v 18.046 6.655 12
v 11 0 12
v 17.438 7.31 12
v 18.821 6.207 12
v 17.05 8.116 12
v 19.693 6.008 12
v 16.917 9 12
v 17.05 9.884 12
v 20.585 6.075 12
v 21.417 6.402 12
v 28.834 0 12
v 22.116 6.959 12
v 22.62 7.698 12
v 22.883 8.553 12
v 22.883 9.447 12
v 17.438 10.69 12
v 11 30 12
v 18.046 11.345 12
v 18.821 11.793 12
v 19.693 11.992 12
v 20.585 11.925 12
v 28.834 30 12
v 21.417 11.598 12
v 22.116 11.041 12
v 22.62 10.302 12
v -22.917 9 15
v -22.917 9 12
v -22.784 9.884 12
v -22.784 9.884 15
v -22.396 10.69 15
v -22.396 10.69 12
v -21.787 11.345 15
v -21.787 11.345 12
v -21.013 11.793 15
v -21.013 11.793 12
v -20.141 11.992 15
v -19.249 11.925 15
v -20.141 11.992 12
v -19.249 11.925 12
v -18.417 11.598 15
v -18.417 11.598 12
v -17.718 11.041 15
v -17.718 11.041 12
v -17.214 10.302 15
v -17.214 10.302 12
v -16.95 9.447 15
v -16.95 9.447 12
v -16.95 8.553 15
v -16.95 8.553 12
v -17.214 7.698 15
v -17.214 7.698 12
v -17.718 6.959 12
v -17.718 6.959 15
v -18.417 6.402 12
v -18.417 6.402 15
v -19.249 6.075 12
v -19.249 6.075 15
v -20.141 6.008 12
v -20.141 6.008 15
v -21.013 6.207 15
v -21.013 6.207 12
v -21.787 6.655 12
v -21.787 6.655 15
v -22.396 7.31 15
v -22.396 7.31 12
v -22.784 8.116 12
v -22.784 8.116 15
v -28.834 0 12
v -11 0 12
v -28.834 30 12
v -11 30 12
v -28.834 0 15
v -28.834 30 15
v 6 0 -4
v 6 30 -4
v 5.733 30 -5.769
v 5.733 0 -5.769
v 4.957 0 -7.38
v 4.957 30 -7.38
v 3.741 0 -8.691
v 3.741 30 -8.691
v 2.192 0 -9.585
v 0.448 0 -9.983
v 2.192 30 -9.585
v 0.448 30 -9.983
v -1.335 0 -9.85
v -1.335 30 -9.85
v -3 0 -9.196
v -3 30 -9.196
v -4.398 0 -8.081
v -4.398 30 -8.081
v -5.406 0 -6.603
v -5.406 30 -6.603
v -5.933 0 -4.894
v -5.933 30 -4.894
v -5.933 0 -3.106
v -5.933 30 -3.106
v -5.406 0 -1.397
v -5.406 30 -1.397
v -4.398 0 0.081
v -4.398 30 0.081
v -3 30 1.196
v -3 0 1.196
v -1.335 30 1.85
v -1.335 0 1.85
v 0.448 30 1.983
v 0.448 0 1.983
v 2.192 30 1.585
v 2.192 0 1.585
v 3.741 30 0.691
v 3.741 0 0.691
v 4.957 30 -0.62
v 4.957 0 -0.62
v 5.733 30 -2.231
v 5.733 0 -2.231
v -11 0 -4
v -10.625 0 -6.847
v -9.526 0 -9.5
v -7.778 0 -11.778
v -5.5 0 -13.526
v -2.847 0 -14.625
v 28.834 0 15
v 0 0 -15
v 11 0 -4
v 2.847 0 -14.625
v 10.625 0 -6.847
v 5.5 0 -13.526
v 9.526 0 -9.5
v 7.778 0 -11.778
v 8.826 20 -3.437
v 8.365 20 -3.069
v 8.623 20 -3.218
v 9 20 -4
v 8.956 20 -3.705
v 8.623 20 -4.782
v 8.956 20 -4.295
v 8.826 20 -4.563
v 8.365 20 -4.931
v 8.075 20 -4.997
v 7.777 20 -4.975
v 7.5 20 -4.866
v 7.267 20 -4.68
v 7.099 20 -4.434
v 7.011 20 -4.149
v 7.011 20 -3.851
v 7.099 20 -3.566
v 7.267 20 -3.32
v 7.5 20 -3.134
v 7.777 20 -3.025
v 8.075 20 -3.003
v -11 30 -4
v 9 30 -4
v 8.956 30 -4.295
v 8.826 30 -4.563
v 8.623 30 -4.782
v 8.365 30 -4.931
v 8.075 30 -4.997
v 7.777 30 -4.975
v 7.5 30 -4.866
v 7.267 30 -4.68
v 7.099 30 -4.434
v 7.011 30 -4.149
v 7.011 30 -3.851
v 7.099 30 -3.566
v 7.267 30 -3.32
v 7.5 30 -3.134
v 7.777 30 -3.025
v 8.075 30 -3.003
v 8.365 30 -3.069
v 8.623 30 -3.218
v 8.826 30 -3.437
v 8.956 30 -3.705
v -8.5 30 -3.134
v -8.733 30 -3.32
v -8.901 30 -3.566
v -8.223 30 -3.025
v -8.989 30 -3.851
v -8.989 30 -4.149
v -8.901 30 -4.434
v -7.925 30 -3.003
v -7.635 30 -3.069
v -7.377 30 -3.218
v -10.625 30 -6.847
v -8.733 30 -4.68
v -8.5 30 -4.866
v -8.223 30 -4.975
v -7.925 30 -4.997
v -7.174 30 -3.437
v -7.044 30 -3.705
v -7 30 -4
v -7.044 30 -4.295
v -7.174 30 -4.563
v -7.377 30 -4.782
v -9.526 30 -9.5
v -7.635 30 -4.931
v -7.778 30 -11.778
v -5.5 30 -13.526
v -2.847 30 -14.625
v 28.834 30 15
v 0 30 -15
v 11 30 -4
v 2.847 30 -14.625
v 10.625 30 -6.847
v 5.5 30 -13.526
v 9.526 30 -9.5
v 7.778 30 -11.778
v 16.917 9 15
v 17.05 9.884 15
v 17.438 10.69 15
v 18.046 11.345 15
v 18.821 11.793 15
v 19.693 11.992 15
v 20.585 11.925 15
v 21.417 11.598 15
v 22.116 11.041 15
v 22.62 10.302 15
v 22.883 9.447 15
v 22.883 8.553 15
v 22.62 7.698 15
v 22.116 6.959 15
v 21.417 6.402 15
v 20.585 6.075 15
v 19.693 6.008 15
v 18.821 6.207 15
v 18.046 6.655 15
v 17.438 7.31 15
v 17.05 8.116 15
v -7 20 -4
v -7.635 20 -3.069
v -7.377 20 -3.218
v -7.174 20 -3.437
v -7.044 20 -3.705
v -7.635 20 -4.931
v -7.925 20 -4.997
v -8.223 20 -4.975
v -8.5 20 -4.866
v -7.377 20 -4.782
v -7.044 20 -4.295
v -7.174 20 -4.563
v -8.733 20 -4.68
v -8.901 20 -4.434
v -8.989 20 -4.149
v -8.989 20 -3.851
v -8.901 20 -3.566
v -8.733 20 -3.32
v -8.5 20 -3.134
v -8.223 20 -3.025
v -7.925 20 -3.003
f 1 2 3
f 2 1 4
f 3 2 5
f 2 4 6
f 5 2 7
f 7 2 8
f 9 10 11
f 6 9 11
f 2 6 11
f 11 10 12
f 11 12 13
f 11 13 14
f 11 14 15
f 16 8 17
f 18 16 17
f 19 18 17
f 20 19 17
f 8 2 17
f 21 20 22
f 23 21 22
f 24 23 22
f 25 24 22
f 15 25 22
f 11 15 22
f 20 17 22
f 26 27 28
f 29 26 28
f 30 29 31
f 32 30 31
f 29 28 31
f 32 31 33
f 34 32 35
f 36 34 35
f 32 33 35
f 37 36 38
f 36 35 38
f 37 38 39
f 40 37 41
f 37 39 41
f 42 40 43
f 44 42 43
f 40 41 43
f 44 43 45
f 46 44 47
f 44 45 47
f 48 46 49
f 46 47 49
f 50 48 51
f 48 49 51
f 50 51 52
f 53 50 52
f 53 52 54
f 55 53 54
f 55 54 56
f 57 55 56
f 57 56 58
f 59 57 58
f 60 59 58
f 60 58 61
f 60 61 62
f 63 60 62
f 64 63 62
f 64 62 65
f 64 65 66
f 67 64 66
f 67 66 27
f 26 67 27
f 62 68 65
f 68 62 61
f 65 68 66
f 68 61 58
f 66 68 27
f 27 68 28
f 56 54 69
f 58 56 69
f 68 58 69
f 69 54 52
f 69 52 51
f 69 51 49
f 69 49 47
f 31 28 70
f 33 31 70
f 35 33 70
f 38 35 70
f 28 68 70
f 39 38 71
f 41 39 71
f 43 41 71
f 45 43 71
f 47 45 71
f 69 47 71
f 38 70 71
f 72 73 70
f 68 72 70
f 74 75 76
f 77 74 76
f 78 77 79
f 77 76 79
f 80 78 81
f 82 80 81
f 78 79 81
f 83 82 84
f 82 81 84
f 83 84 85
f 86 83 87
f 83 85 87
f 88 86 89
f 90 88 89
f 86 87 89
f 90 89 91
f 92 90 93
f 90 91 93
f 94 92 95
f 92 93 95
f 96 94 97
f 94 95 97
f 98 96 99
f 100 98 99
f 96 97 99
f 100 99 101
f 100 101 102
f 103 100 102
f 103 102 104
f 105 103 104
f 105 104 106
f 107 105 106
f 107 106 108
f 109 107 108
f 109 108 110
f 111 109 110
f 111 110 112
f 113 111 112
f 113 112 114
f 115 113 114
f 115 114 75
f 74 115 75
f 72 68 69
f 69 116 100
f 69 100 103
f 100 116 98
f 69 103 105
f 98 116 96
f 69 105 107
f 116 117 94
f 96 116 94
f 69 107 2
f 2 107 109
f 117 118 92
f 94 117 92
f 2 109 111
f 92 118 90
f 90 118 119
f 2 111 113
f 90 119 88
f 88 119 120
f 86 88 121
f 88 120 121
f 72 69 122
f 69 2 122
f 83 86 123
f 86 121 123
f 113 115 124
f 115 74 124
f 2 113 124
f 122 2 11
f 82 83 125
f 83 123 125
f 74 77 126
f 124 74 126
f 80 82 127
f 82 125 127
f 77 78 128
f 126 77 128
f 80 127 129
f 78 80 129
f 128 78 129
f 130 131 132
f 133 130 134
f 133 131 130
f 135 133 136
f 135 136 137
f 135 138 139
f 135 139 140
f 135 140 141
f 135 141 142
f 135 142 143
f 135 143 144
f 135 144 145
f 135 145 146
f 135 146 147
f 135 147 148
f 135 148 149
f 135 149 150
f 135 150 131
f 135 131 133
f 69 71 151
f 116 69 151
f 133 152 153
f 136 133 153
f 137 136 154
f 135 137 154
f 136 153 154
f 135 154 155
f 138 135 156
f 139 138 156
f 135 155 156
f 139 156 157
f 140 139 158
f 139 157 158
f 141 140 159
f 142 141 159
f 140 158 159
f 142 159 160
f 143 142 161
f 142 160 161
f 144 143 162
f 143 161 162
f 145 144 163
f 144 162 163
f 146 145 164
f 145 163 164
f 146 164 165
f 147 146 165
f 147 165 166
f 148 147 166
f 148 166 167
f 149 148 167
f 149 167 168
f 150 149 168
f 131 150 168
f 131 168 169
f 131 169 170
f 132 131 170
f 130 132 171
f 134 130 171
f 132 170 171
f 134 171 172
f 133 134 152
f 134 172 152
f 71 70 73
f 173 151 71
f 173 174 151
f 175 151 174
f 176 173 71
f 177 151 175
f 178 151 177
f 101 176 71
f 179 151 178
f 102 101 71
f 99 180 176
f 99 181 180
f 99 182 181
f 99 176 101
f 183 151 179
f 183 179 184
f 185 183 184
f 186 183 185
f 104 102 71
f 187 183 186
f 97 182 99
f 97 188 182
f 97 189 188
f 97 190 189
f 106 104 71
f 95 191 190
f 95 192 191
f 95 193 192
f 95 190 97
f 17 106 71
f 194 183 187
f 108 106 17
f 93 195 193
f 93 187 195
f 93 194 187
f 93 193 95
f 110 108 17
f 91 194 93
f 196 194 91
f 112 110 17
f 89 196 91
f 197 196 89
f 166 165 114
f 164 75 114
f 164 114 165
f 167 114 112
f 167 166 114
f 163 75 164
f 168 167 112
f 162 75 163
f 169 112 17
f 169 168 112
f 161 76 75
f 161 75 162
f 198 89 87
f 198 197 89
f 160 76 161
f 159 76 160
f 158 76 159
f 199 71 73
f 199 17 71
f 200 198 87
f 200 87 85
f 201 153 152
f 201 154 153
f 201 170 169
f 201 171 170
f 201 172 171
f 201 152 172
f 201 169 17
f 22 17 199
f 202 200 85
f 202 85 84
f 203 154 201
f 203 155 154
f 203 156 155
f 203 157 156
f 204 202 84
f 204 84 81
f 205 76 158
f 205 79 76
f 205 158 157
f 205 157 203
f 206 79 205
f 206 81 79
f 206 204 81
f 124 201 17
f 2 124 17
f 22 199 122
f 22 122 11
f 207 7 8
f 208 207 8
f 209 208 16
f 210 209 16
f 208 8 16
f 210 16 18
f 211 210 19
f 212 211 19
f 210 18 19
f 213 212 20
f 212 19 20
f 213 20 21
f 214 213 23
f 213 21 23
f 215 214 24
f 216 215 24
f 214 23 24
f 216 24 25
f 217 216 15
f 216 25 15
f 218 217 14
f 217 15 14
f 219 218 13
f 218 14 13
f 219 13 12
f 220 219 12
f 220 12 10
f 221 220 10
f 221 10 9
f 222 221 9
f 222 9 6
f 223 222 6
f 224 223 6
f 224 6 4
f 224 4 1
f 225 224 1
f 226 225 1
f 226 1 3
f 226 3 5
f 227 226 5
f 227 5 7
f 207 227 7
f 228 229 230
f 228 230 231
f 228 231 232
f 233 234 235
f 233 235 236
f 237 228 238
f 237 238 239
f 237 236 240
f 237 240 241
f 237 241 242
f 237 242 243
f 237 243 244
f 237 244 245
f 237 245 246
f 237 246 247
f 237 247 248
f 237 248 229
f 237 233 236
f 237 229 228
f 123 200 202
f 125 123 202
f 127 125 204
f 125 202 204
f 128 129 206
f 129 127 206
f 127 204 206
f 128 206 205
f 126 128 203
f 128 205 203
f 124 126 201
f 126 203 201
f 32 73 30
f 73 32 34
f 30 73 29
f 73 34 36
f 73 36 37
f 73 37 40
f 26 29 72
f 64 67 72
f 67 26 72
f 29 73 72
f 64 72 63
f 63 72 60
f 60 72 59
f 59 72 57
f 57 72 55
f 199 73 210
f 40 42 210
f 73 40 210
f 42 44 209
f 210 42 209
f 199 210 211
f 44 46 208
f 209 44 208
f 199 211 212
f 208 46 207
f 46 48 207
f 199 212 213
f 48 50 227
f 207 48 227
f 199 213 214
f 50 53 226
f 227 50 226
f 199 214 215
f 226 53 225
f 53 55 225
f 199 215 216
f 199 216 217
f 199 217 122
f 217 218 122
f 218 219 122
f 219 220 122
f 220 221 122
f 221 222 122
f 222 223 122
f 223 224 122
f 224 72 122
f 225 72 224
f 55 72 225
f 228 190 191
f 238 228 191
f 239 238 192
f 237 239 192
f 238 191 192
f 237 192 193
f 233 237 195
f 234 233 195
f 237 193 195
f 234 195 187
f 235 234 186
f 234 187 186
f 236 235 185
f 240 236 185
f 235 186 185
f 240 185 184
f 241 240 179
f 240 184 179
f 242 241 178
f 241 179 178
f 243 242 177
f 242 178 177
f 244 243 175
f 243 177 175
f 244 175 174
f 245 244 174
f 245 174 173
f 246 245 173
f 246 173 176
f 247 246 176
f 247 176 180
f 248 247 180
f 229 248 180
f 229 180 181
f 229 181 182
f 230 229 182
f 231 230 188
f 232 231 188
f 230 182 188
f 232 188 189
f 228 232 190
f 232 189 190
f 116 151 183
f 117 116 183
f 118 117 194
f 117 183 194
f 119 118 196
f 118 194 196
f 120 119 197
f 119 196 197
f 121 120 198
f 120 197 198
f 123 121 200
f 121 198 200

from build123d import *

# Parameters (mm, degrees)
SKETCH1_W           = 57.667844522
SKETCH1_H           = 30
BOSS_EXTRUDE1_DEPTH = 30
SKETCH2_R           = 6
CUT_EXTRUDE2_DEPTH  = 40
CUT_EXTRUDE3_DEPTH  = 31
SKETCH8_R           = 1
CUT_EXTRUDE6_DEPTH  = 10
SKETCH10_R          = 3
CUT_EXTRUDE8_DEPTH  = 10


with BuildPart() as part:
    # Sketch1 → Boss-Extrude1 (new body)
    with BuildSketch(Plane(origin=(0, 0, 0), x_dir=(1, 0, 0), z_dir=(0, 1, 0))):
        Rectangle(SKETCH1_W, SKETCH1_H)
    extrude(amount=BOSS_EXTRUDE1_DEPTH)

    # Sketch2 → Cut-Extrude2 (cut)
    with BuildSketch(Plane(origin=(0, 30, 0), x_dir=(1, 0, 0), z_dir=(0, 1, 0))):
        with Locations((0, 4)):
            Circle(SKETCH2_R)
    extrude(amount=-CUT_EXTRUDE2_DEPTH, mode=Mode.SUBTRACT)

    # Sketch4 → Cut-Extrude3 (cut, through all)
    with BuildSketch(Plane(origin=(0, 30, 0), x_dir=(1, 0, 0), z_dir=(0, 1, 0))):
        with BuildLine():
            ThreePointArc((-4.5e-08, 15), (7.778174577, 11.778174609), (11, 4))
            Line((11, 4), (11, -12))
            Line((11, -12), (28.833922261, -12))
            Line((28.833922261, -12), (28.833922261, 15))
            Line((28.833922261, 15), (-4.5e-08, 15))
        make_face()
        with BuildLine():
            ThreePointArc((-11, 4), (-7.778174609, 11.778174577), (-4.5e-08, 15))
            Line((-4.5e-08, 15), (-28.833922261, 15))
            Line((-28.833922261, 15), (-28.833922261, -12))
            Line((-28.833922261, -12), (-11, -12))
            Line((-11, -12), (-11, 4))
        make_face()
    extrude(amount=-CUT_EXTRUDE3_DEPTH, mode=Mode.SUBTRACT)

    # Sketch8 → Cut-Extrude6 (cut)
    with BuildSketch(Plane(origin=(0, 30, 0), x_dir=(1, 0, 0), z_dir=(0, 1, 0))):
        with Locations((-8, 4)):
            Circle(SKETCH8_R)
        with Locations((8, 4)):
            Circle(SKETCH8_R)
    extrude(amount=-CUT_EXTRUDE6_DEPTH, mode=Mode.SUBTRACT)

    # Sketch10 → Cut-Extrude8 (cut)
    with BuildSketch(Plane(origin=(0, 0, 12), x_dir=(-1, 0, 0), z_dir=(0, 0, -1))):
        with Locations((19.916961131, 9)):
            Circle(SKETCH10_R)
        with Locations((-19.916961131, 9)):
            Circle(SKETCH10_R)
    extrude(amount=-CUT_EXTRUDE8_DEPTH, mode=Mode.SUBTRACT)


solid = part.part
